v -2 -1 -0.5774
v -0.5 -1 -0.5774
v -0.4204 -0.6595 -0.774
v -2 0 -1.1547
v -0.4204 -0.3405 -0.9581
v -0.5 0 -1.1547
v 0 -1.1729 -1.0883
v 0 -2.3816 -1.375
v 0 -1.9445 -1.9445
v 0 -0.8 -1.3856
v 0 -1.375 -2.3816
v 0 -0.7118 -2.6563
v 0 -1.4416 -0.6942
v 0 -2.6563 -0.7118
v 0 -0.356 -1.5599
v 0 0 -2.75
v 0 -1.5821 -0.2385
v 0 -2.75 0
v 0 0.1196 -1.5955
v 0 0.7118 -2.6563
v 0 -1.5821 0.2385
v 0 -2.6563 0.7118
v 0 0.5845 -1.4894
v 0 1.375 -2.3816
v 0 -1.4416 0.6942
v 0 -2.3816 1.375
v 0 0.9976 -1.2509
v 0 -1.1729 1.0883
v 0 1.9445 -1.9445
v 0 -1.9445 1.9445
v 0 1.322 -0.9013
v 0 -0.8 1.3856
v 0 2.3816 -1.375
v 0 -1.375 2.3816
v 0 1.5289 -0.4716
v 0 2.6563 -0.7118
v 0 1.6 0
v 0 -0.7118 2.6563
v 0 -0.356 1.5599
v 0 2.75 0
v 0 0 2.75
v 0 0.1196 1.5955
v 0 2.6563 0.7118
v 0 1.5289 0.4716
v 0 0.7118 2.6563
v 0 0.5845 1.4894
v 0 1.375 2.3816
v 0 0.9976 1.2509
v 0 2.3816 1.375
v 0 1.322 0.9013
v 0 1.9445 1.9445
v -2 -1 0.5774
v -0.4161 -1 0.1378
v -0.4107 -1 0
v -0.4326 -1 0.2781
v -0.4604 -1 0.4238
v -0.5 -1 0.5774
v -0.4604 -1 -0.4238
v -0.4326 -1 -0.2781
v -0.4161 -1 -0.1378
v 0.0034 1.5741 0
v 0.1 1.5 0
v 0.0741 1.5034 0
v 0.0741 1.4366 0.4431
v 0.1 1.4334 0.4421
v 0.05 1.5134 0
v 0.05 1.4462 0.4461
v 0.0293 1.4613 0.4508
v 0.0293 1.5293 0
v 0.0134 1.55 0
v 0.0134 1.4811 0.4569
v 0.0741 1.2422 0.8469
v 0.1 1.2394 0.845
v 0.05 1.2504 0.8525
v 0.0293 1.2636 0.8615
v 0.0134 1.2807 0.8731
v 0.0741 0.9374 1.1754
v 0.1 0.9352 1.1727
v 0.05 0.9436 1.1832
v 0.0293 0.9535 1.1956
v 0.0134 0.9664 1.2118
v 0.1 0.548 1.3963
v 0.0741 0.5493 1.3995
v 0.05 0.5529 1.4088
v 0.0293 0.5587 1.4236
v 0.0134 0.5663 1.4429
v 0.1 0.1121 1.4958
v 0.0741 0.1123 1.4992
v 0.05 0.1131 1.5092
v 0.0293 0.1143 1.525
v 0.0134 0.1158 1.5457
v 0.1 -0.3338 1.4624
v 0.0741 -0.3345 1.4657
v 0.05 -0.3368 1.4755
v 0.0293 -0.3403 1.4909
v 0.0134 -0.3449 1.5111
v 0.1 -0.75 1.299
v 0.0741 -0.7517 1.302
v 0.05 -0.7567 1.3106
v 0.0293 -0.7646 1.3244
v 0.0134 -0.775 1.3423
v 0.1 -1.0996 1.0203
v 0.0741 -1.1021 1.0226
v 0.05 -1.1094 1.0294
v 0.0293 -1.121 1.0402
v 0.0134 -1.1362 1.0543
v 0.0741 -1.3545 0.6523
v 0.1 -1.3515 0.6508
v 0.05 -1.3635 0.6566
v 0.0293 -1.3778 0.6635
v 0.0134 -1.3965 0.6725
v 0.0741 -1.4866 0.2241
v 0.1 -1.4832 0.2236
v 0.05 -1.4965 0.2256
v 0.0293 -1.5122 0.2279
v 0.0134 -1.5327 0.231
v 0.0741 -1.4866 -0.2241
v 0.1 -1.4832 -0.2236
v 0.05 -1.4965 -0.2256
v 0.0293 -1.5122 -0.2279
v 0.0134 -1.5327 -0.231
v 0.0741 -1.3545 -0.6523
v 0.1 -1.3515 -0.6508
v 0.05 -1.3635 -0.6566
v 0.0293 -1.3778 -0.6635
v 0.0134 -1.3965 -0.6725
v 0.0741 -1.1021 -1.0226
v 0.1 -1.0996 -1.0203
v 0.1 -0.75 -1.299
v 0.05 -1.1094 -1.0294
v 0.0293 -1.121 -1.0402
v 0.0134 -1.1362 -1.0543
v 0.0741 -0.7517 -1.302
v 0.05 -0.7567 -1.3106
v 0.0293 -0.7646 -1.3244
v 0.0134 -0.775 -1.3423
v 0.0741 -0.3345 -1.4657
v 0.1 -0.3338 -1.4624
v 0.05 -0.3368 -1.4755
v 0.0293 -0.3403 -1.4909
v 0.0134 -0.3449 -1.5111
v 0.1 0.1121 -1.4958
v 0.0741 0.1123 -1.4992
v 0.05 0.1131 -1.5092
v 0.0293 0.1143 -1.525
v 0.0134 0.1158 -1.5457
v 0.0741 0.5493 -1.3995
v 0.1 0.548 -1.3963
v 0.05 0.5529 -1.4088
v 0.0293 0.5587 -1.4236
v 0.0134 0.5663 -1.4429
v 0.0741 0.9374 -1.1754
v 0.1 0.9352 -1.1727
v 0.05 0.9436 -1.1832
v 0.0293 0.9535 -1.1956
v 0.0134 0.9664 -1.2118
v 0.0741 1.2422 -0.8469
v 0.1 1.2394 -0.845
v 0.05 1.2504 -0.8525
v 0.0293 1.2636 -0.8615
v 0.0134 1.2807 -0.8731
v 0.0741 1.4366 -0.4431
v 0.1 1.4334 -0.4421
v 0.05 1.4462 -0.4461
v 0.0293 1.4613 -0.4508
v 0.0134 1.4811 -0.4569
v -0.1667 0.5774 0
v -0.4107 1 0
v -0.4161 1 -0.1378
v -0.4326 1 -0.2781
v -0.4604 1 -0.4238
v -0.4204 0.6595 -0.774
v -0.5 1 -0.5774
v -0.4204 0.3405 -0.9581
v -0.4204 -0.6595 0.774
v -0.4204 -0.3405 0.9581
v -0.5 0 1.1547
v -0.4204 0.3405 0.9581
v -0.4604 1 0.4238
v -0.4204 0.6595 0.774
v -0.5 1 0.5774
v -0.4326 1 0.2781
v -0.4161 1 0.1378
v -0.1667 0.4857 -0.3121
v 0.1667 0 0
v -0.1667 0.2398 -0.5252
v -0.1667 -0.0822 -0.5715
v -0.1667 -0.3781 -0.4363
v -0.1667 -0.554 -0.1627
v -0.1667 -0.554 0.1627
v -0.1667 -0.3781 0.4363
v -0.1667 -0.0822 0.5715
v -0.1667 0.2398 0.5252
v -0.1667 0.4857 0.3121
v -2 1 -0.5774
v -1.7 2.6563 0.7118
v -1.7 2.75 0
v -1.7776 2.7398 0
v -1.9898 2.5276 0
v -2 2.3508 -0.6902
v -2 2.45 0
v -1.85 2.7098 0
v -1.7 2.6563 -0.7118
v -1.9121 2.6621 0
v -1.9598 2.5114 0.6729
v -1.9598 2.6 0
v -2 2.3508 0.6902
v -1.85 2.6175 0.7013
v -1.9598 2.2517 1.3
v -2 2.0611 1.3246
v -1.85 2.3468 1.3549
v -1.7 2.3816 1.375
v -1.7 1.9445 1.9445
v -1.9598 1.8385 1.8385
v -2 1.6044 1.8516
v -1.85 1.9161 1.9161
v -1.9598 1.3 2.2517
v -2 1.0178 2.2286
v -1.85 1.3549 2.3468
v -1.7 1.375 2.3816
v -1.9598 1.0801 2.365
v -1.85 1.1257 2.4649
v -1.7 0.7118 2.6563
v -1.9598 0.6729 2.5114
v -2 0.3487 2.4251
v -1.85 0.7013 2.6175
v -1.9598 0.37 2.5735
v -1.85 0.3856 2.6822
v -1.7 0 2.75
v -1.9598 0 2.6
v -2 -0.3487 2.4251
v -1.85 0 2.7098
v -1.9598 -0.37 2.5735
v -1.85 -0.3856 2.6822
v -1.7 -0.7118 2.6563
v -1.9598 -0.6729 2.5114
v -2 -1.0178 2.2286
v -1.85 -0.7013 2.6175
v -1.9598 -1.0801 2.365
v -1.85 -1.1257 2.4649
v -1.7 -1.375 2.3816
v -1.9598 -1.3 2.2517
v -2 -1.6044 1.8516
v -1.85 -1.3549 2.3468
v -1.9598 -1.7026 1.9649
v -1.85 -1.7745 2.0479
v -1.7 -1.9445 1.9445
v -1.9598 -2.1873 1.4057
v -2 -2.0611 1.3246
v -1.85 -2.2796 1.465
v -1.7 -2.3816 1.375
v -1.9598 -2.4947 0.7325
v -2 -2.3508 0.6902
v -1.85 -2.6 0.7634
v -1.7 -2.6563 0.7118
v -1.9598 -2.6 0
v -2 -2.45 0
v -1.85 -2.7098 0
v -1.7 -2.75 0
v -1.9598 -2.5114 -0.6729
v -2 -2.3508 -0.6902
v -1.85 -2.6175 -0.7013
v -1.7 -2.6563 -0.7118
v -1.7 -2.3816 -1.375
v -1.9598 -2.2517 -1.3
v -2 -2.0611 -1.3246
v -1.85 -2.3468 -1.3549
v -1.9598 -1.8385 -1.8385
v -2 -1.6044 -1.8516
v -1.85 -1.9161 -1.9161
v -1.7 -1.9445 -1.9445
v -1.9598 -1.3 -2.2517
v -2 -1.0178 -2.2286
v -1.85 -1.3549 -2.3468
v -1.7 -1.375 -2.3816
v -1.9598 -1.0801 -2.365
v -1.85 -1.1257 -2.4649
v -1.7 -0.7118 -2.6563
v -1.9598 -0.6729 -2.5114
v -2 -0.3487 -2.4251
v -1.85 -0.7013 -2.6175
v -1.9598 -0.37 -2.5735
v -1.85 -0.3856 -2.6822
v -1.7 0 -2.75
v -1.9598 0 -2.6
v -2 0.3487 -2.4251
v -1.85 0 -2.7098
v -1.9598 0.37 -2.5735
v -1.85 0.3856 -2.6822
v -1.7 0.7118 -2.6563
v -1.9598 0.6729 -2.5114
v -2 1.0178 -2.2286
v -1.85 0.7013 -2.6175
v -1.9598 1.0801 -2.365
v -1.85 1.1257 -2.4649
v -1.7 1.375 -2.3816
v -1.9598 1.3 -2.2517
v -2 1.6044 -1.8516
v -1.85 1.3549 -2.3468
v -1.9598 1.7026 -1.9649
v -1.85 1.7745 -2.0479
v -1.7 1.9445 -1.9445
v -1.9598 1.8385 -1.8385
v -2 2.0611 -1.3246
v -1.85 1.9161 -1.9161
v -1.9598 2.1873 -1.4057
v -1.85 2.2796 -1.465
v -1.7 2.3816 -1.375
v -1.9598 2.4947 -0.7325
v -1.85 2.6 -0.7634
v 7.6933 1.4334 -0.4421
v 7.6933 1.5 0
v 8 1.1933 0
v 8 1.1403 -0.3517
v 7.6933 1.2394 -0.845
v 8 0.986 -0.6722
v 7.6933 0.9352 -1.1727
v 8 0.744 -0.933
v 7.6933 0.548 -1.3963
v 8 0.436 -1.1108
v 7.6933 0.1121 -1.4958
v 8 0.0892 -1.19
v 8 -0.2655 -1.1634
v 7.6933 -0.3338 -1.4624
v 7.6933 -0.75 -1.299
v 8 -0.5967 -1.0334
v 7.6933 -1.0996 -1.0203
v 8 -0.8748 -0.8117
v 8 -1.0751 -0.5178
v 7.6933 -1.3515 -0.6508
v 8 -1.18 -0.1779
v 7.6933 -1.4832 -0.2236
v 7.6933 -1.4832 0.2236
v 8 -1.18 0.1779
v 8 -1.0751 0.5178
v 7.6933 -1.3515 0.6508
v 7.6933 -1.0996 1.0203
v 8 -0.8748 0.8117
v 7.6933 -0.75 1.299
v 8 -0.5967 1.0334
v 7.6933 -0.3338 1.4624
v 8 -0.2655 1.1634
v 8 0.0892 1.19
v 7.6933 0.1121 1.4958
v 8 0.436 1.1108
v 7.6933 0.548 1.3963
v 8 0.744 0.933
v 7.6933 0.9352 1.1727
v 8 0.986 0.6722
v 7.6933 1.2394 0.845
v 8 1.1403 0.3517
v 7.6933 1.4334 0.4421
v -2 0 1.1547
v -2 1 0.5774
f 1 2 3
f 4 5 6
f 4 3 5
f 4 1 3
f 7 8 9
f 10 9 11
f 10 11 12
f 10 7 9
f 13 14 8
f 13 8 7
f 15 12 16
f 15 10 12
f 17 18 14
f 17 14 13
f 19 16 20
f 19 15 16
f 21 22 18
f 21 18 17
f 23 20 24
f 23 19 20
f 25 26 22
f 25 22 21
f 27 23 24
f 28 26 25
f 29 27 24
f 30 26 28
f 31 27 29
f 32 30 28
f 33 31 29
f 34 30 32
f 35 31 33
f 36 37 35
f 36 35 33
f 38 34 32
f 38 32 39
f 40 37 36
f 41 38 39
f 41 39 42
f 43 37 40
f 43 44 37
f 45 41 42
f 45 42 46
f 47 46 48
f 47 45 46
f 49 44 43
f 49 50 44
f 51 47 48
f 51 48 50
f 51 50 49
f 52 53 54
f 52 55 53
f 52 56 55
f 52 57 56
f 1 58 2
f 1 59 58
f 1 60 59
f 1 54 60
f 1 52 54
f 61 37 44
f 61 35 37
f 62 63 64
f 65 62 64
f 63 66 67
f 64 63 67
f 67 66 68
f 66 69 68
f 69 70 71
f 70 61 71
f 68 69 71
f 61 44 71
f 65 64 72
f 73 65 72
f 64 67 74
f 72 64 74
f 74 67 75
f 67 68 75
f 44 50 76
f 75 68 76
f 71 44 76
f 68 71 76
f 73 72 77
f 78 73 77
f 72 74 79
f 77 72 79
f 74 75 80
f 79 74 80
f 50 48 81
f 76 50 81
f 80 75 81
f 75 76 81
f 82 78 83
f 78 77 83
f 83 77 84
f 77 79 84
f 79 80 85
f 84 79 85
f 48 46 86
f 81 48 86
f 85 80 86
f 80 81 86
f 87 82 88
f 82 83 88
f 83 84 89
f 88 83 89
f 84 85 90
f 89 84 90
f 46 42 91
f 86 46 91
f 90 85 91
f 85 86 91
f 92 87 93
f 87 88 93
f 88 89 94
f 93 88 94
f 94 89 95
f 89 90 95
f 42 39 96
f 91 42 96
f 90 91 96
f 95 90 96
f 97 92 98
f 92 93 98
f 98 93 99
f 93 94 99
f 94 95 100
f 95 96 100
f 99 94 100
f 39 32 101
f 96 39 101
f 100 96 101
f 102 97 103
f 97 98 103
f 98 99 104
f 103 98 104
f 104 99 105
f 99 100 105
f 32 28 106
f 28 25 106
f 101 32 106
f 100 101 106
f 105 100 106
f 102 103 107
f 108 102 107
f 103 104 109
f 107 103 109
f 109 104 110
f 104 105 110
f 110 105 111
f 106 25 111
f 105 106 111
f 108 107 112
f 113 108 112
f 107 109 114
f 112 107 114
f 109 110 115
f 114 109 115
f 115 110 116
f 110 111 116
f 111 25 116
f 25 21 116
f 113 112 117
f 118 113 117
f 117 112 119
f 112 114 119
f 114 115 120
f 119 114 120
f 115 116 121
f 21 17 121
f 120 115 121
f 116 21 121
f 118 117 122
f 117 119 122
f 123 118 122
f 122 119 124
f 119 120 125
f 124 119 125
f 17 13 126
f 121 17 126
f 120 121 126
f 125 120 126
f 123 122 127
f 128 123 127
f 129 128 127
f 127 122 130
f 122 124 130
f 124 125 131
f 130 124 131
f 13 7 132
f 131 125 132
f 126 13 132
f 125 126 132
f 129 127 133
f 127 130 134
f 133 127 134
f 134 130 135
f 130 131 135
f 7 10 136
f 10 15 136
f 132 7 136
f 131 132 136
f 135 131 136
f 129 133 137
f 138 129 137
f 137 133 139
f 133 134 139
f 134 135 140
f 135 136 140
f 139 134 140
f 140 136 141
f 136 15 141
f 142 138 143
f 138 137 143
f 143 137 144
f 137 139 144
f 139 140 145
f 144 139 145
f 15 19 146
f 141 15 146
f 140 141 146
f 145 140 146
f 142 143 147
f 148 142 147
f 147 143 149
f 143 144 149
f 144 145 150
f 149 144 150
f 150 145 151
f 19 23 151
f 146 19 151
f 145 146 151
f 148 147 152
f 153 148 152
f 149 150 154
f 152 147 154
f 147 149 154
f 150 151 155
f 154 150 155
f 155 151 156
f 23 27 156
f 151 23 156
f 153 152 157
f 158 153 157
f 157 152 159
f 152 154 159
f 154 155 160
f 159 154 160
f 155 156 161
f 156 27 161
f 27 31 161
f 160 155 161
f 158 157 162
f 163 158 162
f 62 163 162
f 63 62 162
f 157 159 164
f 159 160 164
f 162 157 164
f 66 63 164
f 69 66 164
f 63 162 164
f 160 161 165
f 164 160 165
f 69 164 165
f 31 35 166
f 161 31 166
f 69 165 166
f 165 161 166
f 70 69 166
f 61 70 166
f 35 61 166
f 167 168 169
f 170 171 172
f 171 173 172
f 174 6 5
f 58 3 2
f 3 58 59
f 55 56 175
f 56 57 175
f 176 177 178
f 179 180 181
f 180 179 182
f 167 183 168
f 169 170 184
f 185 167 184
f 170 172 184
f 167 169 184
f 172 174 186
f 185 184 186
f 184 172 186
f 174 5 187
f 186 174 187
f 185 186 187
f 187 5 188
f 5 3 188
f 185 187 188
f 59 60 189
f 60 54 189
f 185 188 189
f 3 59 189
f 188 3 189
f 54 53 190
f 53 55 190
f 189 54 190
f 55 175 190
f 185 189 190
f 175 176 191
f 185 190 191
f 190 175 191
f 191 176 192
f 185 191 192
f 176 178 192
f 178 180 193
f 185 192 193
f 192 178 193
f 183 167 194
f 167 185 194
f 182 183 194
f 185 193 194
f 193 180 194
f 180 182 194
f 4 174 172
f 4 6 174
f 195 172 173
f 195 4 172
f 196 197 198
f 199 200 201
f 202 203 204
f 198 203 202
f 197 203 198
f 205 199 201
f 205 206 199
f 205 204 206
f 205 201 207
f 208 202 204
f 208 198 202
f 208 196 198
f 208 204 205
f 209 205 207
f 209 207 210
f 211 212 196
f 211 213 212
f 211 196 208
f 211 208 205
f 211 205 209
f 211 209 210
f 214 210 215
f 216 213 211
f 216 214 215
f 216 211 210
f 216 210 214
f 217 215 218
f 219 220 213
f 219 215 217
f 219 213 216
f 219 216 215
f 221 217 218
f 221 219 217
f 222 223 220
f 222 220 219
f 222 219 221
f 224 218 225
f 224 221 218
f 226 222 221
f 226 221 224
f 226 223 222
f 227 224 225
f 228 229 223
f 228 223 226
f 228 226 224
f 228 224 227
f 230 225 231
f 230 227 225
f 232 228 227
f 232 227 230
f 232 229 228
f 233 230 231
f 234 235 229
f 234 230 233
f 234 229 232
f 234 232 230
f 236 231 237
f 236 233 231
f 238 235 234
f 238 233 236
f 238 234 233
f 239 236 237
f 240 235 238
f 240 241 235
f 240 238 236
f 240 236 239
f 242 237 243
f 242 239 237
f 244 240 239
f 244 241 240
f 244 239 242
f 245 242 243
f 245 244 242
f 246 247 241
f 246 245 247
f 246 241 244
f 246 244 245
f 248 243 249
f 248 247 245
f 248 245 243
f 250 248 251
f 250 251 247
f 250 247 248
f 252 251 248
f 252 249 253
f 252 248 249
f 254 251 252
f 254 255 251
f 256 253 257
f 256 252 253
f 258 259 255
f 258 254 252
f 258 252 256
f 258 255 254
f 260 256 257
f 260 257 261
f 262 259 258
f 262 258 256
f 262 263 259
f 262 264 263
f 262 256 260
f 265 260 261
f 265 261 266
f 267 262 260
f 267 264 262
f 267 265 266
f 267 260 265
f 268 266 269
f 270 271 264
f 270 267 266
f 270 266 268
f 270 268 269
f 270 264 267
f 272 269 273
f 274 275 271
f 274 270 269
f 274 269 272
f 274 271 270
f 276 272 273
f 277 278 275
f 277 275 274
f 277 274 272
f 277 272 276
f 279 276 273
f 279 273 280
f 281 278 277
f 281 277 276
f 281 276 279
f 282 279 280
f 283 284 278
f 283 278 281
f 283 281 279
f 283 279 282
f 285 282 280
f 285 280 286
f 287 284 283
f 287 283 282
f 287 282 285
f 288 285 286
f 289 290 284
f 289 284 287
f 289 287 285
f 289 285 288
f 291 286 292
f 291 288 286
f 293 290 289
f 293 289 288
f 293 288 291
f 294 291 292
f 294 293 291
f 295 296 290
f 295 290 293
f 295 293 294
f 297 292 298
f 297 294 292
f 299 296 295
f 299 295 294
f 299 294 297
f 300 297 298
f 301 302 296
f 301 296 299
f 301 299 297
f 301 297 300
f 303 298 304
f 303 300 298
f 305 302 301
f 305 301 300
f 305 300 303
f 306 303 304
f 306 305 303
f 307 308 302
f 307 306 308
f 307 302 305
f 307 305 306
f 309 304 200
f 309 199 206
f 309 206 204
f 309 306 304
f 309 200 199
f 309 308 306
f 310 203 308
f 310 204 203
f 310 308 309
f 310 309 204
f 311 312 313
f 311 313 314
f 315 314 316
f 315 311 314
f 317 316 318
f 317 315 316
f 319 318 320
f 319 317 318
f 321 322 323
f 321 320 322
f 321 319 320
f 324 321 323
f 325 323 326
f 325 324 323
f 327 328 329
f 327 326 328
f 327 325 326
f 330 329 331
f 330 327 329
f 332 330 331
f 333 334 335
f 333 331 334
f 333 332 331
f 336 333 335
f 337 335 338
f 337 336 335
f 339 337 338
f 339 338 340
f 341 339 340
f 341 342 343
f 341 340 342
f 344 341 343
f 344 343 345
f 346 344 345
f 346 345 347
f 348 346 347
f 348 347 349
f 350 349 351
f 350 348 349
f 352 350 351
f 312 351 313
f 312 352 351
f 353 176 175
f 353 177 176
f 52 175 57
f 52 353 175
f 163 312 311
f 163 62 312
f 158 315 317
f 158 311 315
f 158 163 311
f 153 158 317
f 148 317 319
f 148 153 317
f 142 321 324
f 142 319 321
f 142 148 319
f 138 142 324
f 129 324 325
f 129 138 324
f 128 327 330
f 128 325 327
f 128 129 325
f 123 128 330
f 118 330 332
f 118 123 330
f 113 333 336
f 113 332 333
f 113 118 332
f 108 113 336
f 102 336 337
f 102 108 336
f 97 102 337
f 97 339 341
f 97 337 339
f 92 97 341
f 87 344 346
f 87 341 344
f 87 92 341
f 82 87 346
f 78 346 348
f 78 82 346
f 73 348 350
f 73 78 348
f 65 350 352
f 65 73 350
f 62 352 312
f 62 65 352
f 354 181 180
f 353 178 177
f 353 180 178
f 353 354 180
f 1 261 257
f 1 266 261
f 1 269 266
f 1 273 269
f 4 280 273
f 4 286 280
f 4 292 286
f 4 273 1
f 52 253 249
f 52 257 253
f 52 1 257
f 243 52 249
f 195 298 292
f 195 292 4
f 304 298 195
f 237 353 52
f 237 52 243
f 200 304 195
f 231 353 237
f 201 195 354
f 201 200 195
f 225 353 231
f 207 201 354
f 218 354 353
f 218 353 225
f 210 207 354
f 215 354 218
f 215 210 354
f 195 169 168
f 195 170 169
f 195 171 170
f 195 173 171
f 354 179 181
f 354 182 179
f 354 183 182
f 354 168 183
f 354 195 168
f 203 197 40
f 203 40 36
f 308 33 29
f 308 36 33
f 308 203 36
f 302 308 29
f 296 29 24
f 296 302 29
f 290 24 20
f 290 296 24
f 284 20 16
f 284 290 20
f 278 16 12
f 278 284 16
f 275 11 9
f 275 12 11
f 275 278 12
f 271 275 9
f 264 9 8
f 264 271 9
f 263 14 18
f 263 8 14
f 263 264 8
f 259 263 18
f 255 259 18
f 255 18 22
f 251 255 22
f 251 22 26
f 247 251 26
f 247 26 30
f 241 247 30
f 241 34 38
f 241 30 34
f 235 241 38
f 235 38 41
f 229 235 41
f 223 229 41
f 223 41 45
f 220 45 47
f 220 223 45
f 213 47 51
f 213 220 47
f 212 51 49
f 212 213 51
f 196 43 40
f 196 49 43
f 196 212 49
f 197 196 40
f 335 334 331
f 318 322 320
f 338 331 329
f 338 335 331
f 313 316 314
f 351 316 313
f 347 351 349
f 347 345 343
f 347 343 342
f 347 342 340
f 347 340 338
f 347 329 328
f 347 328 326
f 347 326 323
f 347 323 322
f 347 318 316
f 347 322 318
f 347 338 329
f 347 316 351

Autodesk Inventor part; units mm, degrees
ref_plane "YZ Plane" through (0, 0, 0) normal (1, 0, 0) x (0, 1, 0)
ref_plane "XZ Plane" through (0, 0, 0) normal (0, 1, 0) x (-1, 0, 0)
sketch "Szkic1" plane through (0, 0, 0) normal (0, 0, 1) x (1, 0, 0)
  line L0 (0.1667, 0) -> (8, 0)
  line L1 (8, 0) -> (8, 1.5)
  line L2 (8, 1.5) -> (1.5, 1.5)
  line L3 (1.5, 1.5) -> (1.1932, 1.5)
  line L4 (1.1932, 1.5) -> (0, 1.5)
  line L5 (0, 1.5) -> (0, 2.75)
  line L6 (0, 2.75) -> (-2, 2.75)
  line L7 (-2, 2.75) -> (-2, 1.1547)
  line L8 (-2, 1.1547) -> (-0.5, 1.1547)
  line L9 (-0.5, 1.1547) -> (0.1667, 0)
  line L10 (-4, 0) -> (10, 0) projected
  line L11 (0, -0.55) -> (0, 3.3) projected
  line L12 (1.5, 1.5) -> (0, 1.5) construction
  dimension "d1" = 6.5
  dimension "d2" = 0.3068
  dimension "d3" = 2
  dimension "d4" = 1.5
  dimension "d5" = 60
  dimension "d6" = 3
  dimension "d7" = 3
  dimension "d8" = 2.3094
  dimension "d9" = 5.5
  dimension "d26" = 8
revolve "Bryła" add sketch "Szkic1" angle 360 about axis through (0.1667, 0, 0) along (1, 0, 0) contours L9 L11 L4 L3 L2 L1 L0 | L9 L8 L7 L6 L5 L11
sketch "Szkic2" plane through (-2, 0, 0) normal (-1, 0, 0) x (0, 0, 1)
  circle A0 centre (0, 0) radius 1.1547 projected
  line L0 (0, -3.85) -> (0, 3.85) projected
  line L1 (-3.85, 0) -> (3.85, 0) projected
  line L2 (1.1547, 0) -> (0.5774, -1)
  line L3 (0.5774, -1) -> (-0.5774, -1)
  line L4 (-0.5774, -1) -> (-1.1547, 0)
  line L5 (-1.1547, 0) -> (-0.5774, 1)
  line L6 (-0.5774, 1) -> (0.5774, 1)
  line L7 (0.5774, 1) -> (1.1547, 0)
  point P0 (0, 0)
extrude "Szczelina" add sketch "Szkic2" against normal up to next contours L7 A0 | A0 L2 | L6 L0 A0 | A0 L0 L3 | L0 L6 A0 | A0 L3 L0 | L4 A0 | A0 L5
fillet "Zaokrąglenie1" radius 0.3 1 edges at (-2, -2.75, 0)
thread "Gwint" size "M3x0.5" class "6g" standard "ISO Metric profile" length 6.5
chamfer "Faza1" distance 0.3067 distance2 0.3067 1 edges at (8, -1.5, 0) measured on face at (8, 0.5539, 0.4443)
ref_plane "Work Plane1" through (29, 0, 0) normal (0, -1, 0) x (1, 0, 0)
fillet "Fillet2" radius 0.1 1 edges at (0, -1.5, 0)
equation "\"d1\" = GEL"
equation "\"d3\" = KOH"
equation "\"d4\" = INTI"
equation "\"d6\" = GD"
equation "\"d7\" = BDM"
equation "\"d8\" = 1.1547 * SW"
equation "\"d9\" = KOD"
equation "\"d26\" = NLG"
equation "\"d30\" = R"
equation "\"d17\" = RR"
equation "\"d13\" = GEL"
equation "\"d15\" = -0.5 * SPD + 0.5 * GD"
equation "\"d16\" = GUL"
equation "\"GD\" = NND"
equation "\"NLG\" = 8"
equation "\"GEL\" = 6.5"
equation "\"KOD\" = 5.5"
equation "\"KOH\" = 2"
equation "\"INTI\" = 1.5"
equation "\"GAL\" = 0.61345 * PTC"
equation "\"GUL\" = 0.61345 * PTC"
equation "\"BDM\" = NND"
equation "\"SW\" = 2"
equation "\"RR\" = 0.3"
equation "\"SPD\" = NND - 1.2269 * PTC"
equation "\"R\" = 0.1"
equation "\"TOA\" = 30deg"
equation "\"GD1\" = THREADDIA - 1.2269 * PTC"
equation "\"THREADDIA\" = 3"
equation "\"FAWI\" = 45deg"
equation "\"ANG\" = 120deg"
equation "\"PTC\" = 0.5"
equation "\"NND\" = 3"
equation "\"E0\" = 1.155 * SW"
properties part number "DIN 7984 - M3 x 8" material "Stal, miękka"
